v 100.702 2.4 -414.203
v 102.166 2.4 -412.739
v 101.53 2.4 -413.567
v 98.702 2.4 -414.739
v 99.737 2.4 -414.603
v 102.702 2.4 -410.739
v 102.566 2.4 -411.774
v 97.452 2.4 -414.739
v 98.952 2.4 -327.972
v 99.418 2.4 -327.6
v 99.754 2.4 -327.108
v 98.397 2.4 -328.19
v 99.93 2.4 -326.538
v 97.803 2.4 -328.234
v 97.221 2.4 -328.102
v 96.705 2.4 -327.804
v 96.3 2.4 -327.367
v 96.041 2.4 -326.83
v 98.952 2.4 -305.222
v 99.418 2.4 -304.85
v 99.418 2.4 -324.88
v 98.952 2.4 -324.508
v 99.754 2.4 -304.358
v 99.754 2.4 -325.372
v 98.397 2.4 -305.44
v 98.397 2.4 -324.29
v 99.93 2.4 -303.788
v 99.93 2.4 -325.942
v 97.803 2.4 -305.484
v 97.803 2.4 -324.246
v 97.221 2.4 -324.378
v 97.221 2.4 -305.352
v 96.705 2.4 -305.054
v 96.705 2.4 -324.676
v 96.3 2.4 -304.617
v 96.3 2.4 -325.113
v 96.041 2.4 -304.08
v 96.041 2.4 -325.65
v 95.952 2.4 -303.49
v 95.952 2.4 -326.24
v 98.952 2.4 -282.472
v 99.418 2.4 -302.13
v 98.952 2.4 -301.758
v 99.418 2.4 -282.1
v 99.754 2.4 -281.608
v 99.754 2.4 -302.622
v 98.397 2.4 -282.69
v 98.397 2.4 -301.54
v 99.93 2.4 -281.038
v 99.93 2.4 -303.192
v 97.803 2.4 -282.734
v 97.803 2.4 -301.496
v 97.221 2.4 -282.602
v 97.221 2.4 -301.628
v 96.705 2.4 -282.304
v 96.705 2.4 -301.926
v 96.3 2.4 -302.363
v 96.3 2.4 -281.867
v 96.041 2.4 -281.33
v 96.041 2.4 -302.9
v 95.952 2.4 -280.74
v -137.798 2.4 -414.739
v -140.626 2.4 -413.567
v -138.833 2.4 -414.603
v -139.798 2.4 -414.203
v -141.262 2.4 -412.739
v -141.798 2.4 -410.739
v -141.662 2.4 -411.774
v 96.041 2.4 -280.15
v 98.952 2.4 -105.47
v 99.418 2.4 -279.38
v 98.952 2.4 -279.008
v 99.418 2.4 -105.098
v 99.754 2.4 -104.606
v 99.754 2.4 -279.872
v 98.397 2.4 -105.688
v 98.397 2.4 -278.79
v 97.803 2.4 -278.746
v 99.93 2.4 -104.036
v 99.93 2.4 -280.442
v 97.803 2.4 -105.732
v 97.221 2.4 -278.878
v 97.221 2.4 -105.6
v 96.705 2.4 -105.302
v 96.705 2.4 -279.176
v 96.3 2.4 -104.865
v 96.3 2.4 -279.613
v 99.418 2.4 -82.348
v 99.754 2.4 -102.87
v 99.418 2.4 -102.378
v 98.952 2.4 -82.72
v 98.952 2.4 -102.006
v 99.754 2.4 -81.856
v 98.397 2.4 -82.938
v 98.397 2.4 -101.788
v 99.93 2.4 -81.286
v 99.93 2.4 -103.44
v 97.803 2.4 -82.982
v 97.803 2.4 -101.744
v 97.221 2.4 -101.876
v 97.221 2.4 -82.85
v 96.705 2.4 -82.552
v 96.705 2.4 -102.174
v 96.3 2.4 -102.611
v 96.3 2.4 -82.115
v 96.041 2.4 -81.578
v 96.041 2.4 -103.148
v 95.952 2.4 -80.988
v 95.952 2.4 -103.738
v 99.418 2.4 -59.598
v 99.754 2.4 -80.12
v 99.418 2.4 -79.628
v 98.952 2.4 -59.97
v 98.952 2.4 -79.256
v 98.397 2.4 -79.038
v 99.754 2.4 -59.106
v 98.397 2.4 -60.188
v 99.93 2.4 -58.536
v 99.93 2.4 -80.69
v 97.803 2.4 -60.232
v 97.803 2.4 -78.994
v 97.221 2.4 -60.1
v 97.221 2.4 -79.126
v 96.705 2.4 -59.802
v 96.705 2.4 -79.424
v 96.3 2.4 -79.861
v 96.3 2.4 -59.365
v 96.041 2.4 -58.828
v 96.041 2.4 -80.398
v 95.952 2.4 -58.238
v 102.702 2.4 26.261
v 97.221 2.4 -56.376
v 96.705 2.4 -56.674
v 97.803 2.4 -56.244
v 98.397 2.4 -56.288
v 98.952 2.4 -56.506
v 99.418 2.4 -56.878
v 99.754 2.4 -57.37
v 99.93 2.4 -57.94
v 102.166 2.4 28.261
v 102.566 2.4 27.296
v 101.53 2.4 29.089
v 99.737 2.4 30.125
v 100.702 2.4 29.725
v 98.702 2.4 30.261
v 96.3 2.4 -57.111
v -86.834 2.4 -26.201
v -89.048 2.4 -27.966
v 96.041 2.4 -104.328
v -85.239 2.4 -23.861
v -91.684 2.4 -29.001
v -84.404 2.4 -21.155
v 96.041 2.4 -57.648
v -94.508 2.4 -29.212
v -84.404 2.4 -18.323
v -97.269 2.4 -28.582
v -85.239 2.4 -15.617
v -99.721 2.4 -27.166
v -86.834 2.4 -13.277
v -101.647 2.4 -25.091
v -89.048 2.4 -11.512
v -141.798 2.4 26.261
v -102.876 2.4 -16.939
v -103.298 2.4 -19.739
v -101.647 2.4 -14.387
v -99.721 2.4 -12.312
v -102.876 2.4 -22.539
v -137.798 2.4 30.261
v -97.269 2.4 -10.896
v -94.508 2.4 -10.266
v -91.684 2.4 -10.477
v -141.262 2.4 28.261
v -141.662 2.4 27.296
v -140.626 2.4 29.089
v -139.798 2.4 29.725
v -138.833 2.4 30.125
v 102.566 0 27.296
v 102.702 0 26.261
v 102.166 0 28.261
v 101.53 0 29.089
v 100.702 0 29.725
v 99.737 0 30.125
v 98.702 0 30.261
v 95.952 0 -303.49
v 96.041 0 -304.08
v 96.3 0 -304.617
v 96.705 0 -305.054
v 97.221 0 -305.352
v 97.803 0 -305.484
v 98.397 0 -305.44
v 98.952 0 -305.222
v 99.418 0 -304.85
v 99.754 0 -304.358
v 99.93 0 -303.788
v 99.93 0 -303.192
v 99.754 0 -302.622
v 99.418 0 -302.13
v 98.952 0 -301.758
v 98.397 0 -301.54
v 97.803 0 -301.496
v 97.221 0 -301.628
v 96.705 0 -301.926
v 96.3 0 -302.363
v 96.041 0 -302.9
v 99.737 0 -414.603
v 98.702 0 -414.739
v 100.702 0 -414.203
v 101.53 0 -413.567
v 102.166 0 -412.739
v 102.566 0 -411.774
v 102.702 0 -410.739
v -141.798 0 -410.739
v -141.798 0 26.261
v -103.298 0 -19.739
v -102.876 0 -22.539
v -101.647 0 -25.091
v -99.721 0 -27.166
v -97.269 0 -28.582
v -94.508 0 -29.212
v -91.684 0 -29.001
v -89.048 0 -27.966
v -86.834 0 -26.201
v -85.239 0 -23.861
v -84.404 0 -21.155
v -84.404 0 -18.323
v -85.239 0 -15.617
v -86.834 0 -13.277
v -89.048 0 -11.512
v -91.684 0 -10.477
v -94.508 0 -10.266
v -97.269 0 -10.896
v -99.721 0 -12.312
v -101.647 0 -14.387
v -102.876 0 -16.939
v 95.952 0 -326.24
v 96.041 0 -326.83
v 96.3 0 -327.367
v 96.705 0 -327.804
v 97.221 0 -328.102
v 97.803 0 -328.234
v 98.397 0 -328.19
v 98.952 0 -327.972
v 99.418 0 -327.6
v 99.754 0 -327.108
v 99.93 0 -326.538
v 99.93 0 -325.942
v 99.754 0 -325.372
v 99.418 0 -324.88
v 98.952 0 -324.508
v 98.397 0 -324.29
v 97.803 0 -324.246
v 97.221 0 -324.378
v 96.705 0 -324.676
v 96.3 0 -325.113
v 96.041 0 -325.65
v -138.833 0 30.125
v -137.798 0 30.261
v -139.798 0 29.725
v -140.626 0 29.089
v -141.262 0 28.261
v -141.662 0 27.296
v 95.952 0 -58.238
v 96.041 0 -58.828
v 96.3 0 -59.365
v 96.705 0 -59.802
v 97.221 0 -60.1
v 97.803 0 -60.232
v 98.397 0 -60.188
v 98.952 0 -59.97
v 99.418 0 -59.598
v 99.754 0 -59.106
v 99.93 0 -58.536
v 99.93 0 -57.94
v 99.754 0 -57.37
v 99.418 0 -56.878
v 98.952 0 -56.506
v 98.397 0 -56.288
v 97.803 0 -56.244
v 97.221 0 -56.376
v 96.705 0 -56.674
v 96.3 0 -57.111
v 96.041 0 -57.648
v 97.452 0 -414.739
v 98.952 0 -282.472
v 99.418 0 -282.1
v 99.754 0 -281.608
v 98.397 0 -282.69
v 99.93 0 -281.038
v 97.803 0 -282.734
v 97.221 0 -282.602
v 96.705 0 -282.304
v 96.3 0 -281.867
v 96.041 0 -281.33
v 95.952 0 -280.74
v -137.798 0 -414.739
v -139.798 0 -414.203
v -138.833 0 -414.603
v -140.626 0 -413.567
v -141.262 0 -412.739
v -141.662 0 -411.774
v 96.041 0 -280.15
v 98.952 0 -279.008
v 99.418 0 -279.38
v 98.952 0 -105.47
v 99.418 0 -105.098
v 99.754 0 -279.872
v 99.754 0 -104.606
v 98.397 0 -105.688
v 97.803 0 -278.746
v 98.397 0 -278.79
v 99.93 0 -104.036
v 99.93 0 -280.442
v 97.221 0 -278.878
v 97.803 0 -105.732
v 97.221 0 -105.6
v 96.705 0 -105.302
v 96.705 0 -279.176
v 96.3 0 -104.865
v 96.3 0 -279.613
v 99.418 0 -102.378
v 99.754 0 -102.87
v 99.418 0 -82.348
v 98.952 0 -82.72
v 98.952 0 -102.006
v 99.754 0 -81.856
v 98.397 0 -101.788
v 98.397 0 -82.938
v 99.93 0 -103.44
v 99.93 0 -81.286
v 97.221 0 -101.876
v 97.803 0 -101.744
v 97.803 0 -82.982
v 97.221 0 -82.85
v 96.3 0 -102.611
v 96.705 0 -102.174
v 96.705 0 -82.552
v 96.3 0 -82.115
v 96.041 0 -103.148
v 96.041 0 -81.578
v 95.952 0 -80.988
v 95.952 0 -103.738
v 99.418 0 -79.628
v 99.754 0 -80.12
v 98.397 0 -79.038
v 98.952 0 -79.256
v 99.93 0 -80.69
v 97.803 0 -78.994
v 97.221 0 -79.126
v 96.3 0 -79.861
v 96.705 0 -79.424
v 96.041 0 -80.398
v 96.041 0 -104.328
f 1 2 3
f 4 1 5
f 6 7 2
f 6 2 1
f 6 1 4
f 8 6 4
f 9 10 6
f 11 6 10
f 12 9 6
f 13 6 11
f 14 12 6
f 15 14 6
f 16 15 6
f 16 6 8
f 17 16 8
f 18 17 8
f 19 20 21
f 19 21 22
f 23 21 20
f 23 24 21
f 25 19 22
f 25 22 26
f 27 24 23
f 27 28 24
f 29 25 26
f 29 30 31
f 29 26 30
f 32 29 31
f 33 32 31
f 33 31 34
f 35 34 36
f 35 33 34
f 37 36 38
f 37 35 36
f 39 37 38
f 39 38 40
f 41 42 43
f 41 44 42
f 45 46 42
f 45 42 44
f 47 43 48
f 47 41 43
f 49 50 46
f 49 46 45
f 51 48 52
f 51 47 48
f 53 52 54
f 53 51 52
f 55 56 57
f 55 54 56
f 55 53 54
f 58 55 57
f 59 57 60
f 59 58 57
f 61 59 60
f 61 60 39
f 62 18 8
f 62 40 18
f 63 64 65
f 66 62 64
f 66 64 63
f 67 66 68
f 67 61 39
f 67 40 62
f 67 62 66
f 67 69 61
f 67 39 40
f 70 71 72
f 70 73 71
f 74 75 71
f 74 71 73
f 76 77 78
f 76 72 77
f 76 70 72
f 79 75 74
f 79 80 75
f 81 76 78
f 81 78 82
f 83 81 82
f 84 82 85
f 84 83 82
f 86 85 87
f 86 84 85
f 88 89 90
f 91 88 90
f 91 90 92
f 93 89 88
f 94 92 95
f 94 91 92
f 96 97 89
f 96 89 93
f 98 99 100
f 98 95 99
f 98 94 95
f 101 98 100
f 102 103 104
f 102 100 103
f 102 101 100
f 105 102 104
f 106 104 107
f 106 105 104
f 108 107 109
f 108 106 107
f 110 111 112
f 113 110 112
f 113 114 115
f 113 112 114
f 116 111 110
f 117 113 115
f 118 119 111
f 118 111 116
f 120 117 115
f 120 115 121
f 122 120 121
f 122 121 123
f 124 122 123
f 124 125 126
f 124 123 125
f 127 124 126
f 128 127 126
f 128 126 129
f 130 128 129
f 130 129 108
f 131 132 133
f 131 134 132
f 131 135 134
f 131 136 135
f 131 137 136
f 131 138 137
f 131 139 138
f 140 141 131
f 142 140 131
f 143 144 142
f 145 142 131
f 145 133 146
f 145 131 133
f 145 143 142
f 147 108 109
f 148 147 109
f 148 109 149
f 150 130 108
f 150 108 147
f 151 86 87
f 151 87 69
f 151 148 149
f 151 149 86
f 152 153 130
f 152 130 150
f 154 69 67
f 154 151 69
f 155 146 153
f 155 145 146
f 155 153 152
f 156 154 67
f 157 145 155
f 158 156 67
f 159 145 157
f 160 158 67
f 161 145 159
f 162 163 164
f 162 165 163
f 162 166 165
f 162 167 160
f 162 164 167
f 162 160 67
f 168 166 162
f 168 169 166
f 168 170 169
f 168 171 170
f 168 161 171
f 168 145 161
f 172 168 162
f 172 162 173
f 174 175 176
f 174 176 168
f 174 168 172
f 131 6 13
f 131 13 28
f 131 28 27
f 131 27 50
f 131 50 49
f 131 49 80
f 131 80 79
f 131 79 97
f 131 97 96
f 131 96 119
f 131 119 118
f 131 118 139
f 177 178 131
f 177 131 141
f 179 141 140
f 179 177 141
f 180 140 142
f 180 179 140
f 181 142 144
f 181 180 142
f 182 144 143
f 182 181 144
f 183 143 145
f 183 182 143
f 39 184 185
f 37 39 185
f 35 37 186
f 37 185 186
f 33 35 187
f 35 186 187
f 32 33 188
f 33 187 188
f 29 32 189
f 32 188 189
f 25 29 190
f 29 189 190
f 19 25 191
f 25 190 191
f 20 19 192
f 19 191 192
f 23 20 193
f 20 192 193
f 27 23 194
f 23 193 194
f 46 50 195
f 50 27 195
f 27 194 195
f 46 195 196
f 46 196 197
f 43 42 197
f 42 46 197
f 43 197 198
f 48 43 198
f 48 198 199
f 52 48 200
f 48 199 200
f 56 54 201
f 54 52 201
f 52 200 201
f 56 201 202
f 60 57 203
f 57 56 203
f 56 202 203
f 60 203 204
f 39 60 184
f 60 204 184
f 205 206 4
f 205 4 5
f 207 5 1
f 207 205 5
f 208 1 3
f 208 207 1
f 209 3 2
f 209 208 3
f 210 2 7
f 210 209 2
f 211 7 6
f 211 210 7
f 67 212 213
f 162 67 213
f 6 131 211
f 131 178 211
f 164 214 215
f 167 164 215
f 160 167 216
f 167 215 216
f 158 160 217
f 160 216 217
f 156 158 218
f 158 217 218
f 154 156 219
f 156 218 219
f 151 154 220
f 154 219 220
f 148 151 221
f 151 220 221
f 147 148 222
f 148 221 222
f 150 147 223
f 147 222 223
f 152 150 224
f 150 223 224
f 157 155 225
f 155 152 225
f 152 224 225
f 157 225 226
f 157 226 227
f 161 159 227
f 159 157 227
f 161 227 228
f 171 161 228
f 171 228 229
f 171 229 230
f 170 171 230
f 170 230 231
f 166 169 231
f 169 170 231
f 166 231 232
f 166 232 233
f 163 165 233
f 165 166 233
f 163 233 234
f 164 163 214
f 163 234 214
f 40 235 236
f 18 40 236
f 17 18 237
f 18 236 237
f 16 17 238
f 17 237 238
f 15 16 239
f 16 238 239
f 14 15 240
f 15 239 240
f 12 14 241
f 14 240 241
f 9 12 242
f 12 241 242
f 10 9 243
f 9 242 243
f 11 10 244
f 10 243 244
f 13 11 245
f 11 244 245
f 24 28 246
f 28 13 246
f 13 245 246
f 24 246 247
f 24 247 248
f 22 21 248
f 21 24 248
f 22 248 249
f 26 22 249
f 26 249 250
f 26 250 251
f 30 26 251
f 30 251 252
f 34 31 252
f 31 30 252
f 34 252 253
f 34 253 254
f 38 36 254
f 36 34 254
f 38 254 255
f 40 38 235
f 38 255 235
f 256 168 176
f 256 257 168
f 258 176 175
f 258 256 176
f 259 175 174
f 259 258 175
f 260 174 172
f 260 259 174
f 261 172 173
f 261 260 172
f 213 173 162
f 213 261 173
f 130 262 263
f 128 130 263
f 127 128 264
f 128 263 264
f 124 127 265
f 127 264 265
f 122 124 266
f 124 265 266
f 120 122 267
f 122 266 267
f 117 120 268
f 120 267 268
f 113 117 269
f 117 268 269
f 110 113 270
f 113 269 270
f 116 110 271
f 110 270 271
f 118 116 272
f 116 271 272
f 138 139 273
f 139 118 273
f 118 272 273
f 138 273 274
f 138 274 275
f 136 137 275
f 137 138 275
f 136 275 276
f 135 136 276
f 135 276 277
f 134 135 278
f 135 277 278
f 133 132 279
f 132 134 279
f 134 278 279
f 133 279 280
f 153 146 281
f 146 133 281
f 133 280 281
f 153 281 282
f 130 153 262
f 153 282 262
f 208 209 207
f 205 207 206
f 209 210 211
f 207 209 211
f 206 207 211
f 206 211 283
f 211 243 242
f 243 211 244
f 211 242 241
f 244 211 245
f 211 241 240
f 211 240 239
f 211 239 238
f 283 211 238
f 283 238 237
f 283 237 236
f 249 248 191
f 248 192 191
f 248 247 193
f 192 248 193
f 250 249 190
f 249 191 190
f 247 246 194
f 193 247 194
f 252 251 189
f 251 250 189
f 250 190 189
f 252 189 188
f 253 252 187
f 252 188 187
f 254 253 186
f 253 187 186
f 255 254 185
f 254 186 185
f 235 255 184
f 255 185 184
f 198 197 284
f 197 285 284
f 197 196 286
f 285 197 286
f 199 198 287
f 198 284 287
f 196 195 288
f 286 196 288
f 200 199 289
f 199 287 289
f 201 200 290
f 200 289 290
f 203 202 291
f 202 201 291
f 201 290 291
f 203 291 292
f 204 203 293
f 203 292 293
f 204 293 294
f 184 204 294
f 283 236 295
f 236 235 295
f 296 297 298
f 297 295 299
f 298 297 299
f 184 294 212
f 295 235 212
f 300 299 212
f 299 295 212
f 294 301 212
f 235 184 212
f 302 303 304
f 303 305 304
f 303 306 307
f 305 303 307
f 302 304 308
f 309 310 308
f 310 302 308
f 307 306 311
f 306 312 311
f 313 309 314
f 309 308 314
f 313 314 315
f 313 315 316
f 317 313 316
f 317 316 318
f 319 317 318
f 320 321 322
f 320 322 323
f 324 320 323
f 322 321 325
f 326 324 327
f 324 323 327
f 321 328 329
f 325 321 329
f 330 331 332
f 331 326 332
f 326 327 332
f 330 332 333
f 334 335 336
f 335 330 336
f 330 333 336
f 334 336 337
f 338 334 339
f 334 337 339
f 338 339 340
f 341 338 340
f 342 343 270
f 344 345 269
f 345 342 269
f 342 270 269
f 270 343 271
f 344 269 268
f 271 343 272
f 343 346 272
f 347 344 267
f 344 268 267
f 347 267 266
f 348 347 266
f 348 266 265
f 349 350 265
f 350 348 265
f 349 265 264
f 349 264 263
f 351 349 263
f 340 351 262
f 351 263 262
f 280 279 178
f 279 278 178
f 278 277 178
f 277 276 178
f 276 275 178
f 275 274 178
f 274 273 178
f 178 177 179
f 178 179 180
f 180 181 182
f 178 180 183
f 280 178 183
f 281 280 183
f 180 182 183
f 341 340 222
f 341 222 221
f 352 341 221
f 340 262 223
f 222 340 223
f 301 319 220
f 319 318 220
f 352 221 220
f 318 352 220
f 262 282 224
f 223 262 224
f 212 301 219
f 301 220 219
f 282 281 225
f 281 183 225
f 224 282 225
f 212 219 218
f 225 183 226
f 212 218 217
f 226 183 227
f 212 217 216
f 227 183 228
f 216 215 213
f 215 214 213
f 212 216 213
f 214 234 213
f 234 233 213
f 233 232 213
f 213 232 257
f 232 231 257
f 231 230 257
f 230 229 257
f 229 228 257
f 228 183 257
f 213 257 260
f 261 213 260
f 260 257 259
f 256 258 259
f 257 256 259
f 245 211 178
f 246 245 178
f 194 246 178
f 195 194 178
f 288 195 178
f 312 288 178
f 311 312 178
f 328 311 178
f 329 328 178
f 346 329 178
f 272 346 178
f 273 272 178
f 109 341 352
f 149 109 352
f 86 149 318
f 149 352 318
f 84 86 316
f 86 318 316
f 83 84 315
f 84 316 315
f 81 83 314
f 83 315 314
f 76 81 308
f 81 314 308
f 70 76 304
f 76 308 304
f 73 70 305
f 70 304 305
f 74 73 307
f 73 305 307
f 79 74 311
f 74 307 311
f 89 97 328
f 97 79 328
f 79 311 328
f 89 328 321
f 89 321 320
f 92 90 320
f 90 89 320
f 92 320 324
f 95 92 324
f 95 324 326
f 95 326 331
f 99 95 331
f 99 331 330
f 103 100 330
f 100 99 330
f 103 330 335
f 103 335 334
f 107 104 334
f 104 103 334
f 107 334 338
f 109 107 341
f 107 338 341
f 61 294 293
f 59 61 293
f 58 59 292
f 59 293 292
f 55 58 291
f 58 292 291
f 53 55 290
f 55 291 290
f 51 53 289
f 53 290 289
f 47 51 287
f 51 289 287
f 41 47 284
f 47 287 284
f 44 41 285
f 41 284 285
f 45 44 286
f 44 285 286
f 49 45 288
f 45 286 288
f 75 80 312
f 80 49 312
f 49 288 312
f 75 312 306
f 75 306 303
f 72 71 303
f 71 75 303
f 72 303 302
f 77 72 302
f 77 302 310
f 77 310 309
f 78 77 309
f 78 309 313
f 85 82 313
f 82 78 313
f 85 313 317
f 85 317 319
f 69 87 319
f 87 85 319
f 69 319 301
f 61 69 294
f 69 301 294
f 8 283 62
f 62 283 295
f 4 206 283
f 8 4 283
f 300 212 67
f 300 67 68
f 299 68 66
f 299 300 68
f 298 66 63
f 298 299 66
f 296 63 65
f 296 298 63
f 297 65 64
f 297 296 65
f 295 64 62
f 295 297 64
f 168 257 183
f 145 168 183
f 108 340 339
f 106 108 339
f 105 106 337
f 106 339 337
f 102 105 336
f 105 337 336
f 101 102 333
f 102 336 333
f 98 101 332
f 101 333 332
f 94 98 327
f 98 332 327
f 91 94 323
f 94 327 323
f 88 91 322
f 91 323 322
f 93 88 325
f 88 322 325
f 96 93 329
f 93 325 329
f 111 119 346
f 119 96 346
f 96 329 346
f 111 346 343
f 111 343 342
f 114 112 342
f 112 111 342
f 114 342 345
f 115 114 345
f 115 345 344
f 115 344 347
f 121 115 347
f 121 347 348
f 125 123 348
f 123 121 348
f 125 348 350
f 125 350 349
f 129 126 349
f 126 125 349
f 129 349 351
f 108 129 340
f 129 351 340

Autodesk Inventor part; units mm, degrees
ref_plane "YZ Plane" through (0, 0, 0) normal (1, 0, 0) x (0, 1, 0)
ref_plane "XZ Plane" through (0, 0, 0) normal (0, 1, 0) x (-1, 0, 0)
ref_plane "XY Plane" through (0, 0, 0) normal (0, 0, 1) x (1, 0, 0)
sketch "Boceto1" plane through (0, 0, 0) normal (0, 1, 0) x (-1, 0, 0)
  line L0 (137.798, 30.261) -> (-98.702, 30.261)
  line L1 (-102.702, 26.261) -> (-102.702, -410.739)
  line L2 (-98.702, -414.739) -> (137.798, -414.739)
  line L3 (141.798, -410.739) -> (141.798, 26.261)
  arc A0 (141.798, 26.261) -> (137.798, 30.261) centre (137.798, 26.261) ccw
  arc A1 (-98.702, 30.261) -> (-102.702, 26.261) centre (-98.702, 26.261) ccw
  arc A2 (-102.702, -410.739) -> (-98.702, -414.739) centre (-98.702, -410.739) ccw
  arc A3 (137.798, -414.739) -> (141.798, -410.739) centre (137.798, -410.739) ccw
  line L4 (-102.702, -414.739) -> (-97.452, -414.739)
  circle A4 centre (-97.952, -58.238) radius 2
  circle A5 centre (-97.952, -326.24) radius 2
  circle A6 centre (-97.952, -80.988) radius 2
  circle A7 centre (-97.952, -103.738) radius 2
  circle A8 centre (-97.952, -303.49) radius 2
  circle A9 centre (-97.952, -280.74) radius 2
  circle A10 centre (93.798, -19.739) radius 9.5
  point P0 (141.798, 30.261)
  point P1 (-102.702, 30.261)
  point P2 (141.798, -414.739)
  dimension "d0" = 244.5
  dimension "d1" = 445
  dimension "d2" = 244.5
  dimension "d3" = 4
  dimension "d6" = 5.25
  dimension "d7" = 4
  dimension "d12" = 4
  dimension "d13" = 88.499
  dimension "d14" = 4
  dimension "d15" = 22.75
  dimension "d16" = 4
  dimension "d17" = 22.75
  dimension "d18" = 88.499
  dimension "d19" = 4.75
  dimension "d20" = 4
  dimension "d21" = 22.75
  dimension "d22" = 4.75
  dimension "d23" = 4
  dimension "d24" = 22.75
  dimension "d25" = 4.75
  dimension "d26" = 4.75
  dimension "d27" = 4.75
  dimension "d28" = 4.75
  dimension "d29" = 19
  dimension "d30" = 50
  dimension "d31" = 48
extrude "Extrusión1" add sketch "Boceto1" along normal blind 2.4
equation "\"d0\" = d2"
equation "\"d13\" = d18"
equation "\"d22\" = d19"
equation "\"d25\" = d22"
equation "\"d26\" = d25"
equation "\"d27\" = d26"
equation "\"d28\" = d27"
properties part number "Puerta de Inspección"
